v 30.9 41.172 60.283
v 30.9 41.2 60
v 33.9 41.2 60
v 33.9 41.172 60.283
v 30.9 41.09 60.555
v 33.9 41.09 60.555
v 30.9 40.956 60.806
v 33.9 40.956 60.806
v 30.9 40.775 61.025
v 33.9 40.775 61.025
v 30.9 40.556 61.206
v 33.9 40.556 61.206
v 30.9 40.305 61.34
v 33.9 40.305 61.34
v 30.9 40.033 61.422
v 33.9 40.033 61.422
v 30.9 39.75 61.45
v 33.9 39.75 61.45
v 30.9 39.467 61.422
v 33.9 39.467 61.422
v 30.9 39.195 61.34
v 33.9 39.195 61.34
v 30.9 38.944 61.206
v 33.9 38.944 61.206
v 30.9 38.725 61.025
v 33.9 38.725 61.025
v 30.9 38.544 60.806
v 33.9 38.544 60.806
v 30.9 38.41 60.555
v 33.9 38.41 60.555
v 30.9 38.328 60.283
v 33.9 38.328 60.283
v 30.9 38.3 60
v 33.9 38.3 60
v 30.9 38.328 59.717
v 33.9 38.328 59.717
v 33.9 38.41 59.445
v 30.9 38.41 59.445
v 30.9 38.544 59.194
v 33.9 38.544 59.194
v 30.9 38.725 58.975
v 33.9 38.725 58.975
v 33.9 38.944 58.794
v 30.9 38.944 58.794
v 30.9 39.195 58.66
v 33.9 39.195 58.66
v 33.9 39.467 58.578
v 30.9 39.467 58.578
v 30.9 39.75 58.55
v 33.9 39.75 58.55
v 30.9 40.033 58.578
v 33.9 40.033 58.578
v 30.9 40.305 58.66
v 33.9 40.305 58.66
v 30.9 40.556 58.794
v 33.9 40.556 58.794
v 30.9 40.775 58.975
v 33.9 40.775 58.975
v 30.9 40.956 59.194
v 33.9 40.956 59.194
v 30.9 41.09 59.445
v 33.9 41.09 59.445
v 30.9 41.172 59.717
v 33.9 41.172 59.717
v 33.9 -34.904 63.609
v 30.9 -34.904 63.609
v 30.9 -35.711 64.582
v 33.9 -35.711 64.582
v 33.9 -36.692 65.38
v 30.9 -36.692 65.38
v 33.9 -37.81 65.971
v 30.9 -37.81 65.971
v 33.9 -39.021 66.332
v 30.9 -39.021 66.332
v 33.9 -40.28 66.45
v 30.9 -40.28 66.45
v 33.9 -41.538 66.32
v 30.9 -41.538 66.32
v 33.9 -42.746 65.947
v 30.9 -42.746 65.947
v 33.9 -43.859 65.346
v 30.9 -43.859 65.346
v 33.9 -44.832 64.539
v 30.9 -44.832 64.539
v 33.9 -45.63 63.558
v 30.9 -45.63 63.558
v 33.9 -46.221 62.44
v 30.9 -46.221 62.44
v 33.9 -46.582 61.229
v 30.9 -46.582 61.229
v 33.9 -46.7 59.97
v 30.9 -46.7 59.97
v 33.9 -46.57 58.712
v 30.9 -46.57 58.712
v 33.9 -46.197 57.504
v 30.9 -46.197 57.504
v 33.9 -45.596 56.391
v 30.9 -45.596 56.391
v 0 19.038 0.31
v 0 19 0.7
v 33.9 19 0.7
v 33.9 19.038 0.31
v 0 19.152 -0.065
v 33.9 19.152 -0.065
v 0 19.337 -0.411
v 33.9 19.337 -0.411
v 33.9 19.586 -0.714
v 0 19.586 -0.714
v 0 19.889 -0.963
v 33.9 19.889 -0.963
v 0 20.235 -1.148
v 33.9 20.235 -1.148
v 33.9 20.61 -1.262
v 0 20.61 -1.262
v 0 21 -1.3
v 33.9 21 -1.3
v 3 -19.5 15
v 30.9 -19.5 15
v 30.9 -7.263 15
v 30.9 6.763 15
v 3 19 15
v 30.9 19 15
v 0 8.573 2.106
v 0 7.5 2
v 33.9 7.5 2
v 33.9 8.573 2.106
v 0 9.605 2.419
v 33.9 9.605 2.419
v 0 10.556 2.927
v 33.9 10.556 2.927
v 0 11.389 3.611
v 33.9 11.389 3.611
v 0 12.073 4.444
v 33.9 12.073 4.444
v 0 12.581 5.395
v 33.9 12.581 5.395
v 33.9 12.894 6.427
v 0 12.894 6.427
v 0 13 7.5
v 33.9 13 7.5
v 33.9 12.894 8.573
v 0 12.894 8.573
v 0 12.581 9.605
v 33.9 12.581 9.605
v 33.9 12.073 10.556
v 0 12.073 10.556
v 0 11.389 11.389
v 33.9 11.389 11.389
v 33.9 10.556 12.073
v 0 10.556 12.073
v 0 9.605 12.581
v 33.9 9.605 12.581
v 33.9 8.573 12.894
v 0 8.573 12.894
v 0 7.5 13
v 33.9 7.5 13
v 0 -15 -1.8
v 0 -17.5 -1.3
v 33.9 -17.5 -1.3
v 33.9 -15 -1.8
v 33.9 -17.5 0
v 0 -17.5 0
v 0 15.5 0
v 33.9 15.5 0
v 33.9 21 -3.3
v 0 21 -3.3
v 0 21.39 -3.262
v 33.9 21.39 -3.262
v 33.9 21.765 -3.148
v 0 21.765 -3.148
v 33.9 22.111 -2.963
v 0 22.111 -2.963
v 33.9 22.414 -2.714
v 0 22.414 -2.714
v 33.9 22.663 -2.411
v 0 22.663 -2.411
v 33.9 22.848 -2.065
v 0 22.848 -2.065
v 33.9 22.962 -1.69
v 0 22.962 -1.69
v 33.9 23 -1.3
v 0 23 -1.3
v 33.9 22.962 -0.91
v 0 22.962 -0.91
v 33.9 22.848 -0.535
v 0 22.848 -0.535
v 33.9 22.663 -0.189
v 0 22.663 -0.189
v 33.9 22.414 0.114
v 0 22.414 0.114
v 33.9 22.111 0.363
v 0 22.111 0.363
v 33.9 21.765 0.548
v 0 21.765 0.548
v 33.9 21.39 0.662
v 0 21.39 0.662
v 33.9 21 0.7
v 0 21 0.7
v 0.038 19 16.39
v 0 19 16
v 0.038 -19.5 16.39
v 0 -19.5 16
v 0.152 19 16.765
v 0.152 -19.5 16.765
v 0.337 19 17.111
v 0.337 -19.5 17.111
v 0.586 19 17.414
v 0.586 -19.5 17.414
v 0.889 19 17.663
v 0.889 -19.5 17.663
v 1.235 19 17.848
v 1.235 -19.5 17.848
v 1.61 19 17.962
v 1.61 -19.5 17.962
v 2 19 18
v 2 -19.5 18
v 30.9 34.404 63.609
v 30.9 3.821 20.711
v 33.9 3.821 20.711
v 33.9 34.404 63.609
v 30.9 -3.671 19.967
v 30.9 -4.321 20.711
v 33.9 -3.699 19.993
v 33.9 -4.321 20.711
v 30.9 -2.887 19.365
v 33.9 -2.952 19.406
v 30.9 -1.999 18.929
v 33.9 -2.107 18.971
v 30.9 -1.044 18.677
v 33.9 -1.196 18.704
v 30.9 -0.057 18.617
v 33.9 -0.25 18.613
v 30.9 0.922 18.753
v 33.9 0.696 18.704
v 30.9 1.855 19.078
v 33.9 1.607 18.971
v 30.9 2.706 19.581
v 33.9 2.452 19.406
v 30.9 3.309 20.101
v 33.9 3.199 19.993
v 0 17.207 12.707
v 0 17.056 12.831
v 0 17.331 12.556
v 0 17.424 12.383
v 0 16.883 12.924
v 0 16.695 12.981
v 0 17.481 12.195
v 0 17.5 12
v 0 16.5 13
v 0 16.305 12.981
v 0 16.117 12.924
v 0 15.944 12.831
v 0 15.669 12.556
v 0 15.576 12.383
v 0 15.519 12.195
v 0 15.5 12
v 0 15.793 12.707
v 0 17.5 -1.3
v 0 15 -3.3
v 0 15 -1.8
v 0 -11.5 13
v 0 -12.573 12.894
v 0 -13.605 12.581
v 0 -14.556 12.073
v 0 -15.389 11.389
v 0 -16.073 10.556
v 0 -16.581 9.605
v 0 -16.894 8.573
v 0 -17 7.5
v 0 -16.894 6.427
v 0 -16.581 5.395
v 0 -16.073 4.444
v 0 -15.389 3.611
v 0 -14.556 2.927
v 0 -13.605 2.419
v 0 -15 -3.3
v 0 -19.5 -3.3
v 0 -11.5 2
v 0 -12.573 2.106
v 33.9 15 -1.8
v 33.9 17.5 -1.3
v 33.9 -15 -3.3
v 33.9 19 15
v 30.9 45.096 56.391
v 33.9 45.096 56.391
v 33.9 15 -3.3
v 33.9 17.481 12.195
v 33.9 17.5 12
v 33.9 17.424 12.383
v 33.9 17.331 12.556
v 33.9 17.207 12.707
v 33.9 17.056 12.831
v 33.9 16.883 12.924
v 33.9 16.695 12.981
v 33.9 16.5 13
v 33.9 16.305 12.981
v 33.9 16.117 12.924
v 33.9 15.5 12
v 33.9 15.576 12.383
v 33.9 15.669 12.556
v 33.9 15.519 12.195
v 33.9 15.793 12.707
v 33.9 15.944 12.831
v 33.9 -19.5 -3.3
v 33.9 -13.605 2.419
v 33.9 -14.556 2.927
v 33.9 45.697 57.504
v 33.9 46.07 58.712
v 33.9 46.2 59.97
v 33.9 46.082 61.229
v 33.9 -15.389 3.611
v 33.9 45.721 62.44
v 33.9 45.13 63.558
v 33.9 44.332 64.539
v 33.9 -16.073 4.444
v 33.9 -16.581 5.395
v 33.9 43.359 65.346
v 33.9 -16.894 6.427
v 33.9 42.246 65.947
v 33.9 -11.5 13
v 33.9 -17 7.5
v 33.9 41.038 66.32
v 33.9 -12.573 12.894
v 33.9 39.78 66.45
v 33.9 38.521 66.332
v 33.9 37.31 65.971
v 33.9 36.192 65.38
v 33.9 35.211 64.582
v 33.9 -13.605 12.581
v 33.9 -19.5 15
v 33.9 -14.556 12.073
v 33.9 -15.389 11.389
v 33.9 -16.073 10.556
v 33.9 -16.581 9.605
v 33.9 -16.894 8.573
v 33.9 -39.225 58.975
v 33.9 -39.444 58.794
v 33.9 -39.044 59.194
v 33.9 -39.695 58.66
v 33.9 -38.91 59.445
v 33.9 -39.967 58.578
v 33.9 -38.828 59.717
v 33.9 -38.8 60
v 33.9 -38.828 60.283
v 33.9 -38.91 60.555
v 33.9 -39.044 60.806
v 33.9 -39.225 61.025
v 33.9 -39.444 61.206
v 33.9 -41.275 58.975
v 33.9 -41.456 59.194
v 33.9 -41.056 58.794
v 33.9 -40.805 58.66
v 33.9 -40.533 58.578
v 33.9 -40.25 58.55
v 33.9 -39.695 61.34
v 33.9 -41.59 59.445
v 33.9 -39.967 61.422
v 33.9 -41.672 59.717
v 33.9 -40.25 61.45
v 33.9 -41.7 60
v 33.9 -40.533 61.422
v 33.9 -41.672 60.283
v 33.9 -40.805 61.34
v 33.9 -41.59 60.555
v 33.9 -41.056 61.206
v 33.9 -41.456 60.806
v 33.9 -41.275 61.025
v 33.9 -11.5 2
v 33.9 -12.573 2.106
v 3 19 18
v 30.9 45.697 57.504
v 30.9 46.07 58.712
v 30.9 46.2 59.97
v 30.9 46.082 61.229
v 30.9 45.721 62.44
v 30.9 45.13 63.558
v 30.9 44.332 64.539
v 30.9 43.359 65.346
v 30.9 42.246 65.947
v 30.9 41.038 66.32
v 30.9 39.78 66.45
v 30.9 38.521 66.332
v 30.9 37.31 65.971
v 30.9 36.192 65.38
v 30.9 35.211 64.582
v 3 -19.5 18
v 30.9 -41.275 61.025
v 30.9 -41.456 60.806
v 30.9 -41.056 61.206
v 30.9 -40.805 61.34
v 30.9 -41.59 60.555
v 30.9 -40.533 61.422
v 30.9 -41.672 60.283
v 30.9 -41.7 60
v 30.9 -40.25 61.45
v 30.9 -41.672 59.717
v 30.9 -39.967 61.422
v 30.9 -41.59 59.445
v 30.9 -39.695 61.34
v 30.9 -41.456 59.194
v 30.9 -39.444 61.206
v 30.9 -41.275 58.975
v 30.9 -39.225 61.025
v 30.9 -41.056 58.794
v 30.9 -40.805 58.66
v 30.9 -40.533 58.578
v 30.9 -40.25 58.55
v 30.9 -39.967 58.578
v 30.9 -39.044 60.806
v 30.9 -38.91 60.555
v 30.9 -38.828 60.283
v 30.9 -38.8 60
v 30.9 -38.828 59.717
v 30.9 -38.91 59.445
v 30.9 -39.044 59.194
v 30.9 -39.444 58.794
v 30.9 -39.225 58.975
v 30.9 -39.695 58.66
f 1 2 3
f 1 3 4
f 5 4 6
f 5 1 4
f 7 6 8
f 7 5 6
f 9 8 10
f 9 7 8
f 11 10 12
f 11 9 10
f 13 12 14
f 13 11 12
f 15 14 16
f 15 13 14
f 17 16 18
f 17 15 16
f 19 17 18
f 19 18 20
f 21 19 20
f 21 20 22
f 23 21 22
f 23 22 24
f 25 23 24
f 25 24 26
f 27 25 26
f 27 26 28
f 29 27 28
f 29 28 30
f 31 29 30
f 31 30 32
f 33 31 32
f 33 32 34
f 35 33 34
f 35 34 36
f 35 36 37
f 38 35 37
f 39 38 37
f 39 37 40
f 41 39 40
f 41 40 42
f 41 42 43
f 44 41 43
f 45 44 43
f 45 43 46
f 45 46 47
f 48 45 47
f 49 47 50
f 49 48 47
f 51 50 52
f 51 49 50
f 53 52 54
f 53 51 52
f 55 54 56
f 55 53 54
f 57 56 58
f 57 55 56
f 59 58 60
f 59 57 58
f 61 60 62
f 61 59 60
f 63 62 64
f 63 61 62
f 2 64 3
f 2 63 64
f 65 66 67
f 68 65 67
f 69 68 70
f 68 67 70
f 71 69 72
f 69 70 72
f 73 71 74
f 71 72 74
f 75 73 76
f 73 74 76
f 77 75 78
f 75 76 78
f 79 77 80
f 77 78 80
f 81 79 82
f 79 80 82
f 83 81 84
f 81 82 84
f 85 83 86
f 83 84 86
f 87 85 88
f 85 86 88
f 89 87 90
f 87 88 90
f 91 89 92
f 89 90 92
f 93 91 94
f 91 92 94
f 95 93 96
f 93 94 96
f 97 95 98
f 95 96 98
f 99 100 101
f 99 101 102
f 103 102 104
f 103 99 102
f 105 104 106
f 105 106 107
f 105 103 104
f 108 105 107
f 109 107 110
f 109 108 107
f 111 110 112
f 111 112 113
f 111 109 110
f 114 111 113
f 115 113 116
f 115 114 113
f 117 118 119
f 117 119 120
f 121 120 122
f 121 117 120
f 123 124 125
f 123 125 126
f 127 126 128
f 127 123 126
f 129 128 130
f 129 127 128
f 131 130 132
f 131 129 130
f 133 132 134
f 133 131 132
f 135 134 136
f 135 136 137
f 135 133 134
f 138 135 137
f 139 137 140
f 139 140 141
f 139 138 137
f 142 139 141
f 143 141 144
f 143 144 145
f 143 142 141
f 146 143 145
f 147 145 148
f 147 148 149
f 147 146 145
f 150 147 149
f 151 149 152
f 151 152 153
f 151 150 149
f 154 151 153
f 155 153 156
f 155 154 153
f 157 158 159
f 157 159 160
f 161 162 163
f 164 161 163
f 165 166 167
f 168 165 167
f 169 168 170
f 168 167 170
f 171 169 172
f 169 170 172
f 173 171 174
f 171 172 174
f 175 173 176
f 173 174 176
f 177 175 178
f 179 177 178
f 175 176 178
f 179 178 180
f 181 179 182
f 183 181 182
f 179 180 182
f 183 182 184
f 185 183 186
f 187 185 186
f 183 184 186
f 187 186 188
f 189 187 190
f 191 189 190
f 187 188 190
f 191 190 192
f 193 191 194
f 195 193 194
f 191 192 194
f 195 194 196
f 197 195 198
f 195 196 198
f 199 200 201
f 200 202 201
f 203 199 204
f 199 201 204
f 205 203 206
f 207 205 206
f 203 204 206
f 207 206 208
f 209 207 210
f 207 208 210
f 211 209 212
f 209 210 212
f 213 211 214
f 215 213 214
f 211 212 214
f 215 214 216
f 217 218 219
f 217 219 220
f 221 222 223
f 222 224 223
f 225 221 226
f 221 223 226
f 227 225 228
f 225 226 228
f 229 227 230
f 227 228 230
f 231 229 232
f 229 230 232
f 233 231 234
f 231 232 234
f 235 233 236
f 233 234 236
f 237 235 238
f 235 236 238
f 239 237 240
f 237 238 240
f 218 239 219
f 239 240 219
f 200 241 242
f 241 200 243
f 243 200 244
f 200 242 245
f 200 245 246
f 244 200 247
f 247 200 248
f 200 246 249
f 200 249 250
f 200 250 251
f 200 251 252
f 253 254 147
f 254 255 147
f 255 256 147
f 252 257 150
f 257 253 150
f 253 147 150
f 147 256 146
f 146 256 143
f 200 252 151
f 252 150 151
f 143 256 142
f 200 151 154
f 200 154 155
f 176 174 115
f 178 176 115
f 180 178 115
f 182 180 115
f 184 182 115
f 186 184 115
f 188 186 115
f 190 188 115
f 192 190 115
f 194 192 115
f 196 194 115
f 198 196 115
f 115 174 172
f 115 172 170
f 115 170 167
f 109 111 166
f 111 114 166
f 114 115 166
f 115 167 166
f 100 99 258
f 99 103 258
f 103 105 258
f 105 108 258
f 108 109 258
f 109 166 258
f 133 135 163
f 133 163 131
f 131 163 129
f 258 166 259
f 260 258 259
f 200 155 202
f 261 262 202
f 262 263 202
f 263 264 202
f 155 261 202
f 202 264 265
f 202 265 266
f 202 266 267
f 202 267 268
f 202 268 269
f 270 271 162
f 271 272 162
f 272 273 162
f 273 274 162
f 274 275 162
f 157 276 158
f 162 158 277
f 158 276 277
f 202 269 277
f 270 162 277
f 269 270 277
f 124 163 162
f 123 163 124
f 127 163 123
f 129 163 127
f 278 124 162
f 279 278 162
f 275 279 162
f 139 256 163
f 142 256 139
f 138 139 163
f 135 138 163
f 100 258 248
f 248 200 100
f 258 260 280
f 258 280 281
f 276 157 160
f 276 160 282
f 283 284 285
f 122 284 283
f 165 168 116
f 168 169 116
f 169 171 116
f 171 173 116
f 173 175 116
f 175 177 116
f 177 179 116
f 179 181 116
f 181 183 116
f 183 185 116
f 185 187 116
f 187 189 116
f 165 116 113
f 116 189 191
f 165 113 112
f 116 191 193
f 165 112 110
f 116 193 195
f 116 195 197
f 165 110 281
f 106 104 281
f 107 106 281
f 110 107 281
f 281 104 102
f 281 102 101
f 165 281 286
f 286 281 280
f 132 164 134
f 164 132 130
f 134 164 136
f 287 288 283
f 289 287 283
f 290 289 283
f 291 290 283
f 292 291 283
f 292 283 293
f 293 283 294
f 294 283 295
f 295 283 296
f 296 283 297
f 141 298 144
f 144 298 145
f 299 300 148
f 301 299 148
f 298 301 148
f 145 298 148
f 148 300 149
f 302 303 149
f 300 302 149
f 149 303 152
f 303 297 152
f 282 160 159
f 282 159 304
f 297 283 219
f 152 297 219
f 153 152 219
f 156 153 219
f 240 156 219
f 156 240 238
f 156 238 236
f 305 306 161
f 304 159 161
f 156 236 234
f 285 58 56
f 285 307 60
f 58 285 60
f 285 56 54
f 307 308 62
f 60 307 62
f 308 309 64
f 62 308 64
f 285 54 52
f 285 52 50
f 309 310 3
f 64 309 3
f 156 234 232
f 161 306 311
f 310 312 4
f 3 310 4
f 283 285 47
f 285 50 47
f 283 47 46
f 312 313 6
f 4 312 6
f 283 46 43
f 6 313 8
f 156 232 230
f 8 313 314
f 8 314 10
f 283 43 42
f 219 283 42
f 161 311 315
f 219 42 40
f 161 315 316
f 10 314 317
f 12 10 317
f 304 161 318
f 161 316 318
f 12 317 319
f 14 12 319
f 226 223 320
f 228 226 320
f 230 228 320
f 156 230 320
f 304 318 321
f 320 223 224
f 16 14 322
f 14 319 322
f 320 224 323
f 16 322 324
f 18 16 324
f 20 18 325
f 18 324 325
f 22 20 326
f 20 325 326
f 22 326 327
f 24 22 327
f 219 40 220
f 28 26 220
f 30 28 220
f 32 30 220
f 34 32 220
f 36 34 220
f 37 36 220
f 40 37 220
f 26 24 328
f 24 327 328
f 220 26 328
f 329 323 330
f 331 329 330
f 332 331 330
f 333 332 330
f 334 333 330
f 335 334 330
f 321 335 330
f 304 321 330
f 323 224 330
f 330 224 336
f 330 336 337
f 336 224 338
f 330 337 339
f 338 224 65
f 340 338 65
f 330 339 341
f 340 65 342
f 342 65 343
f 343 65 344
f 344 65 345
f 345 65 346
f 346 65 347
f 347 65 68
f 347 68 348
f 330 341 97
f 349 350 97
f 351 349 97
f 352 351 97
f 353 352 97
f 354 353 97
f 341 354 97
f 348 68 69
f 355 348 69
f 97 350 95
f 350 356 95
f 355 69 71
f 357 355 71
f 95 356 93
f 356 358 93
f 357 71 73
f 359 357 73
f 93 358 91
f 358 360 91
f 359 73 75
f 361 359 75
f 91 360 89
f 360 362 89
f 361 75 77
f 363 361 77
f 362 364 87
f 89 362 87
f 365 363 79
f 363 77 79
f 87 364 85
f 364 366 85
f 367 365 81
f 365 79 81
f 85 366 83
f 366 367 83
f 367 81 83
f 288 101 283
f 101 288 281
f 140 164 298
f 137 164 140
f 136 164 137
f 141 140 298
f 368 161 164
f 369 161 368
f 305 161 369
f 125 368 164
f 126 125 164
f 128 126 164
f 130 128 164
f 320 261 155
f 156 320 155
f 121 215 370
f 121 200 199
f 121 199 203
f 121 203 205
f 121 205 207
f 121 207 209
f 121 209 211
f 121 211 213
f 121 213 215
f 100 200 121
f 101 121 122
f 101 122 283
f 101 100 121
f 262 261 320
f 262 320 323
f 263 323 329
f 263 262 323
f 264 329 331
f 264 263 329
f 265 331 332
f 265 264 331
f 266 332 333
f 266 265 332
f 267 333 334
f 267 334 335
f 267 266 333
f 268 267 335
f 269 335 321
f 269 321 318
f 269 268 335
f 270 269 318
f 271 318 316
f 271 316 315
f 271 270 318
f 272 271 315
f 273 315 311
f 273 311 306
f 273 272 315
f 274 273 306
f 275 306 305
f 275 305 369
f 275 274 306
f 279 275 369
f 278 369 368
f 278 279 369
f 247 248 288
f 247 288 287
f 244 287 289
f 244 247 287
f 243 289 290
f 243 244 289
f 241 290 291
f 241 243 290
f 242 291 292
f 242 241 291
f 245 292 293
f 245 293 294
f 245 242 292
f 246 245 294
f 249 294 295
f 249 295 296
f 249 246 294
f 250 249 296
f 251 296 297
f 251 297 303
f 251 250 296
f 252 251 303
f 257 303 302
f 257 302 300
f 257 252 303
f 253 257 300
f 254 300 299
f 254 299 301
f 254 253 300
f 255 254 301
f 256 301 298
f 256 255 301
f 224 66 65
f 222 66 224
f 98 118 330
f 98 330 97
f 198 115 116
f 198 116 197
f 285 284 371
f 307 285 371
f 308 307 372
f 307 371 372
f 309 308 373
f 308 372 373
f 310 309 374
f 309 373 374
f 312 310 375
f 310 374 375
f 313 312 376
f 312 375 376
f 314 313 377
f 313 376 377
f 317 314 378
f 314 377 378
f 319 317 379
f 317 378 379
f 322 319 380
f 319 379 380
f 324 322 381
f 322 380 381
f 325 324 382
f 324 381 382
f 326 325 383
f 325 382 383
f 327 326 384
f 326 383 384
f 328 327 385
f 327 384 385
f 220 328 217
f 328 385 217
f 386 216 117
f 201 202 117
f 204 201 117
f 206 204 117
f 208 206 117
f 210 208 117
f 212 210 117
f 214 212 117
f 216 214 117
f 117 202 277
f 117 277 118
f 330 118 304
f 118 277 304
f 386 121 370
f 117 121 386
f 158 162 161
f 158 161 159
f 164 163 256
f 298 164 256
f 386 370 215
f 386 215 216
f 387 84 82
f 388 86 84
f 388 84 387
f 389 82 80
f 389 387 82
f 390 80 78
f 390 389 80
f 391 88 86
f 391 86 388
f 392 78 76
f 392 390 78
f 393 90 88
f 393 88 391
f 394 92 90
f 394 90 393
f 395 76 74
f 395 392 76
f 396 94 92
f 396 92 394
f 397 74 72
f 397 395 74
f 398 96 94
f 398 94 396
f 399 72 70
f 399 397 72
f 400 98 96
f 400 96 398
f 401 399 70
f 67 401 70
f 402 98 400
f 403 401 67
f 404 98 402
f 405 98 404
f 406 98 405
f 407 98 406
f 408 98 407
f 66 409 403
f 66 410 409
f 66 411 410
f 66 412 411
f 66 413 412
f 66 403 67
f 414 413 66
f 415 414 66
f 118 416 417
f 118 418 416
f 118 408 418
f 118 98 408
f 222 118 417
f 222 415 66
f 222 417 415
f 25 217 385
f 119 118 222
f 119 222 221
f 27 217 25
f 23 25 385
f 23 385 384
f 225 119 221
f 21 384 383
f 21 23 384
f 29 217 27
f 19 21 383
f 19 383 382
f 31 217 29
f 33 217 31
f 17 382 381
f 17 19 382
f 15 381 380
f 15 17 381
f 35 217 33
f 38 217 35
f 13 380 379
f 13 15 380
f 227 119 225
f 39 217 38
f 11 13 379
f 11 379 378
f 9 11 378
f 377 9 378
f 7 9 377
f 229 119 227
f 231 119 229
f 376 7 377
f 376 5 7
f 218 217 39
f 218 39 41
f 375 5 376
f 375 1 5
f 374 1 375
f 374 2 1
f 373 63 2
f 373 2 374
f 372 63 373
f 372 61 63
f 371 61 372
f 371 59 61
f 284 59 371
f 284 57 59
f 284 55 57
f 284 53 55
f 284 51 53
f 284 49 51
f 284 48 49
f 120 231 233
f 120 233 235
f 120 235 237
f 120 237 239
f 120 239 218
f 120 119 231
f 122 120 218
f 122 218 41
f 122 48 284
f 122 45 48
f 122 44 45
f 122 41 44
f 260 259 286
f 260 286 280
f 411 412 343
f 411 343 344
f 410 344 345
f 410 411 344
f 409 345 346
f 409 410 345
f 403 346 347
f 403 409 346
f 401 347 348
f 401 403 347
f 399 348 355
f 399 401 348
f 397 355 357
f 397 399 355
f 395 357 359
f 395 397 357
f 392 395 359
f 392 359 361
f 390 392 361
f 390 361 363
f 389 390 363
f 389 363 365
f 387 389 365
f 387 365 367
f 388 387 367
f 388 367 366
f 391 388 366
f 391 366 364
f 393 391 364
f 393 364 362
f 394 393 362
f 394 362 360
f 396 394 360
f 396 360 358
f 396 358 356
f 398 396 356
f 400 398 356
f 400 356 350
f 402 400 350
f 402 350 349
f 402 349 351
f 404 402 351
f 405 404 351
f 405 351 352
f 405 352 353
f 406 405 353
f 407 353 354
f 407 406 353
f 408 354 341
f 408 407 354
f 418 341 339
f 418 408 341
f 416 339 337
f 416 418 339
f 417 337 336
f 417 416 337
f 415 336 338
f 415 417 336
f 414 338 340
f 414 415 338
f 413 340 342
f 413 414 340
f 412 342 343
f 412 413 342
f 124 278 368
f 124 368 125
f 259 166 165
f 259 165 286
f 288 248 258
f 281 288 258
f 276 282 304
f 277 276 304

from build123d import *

# Parameters (mm, degrees)
SKETCH001_R  = 1.45
PAD_DEPTH    = 33.9
SKETCH002_W  = 200
SKETCH002_H  = 80
POCKET_DEPTH = 30.9
SKETCH003_W  = 38.5
SKETCH003_H  = 3
PAD001_DEPTH = 3
FILLET_R     = 2
FILLET001_R  = 5


with BuildPart() as part:
    # Sketch001 → Pad (new body)
    with BuildSketch(Plane.YZ):
        with BuildLine():
            Line((-15, -3.3), (-19.5, -3.3))
            Line((-19.5, -3.3), (-19.5, 15))
            Line((-19.5, 15), (-45.596074, 56.3914))
            ThreePointArc((-34.903926, 63.6086), (-43.8586, 65.346074), (-45.596074, 56.3914))
            Line((-34.903926, 63.6086), (-0.25, 15))
            Line((-0.25, 15), (34.403926, 63.6086))
            ThreePointArc((45.096074, 56.3914), (43.3586, 65.346074), (34.403926, 63.6086))
            Line((45.096074, 56.3914), (19, 15))
            Line((19, 15), (19, 0.7))
            ThreePointArc((19, 0.7), (19.585786, -0.714214), (21, -1.3))
            Line((21, -1.3), (21, 0.7))
            ThreePointArc((21, -3.3), (23, -1.3), (21, 0.7))
            Line((21, -3.3), (15, -3.3))
            Line((15, -3.3), (15, -1.8))
            Line((15, -1.8), (17.5, -1.3))
            Line((17.5, -1.3), (17.5, 0))
            Line((17.5, 12), (17.5, 0))
            ThreePointArc((17.5, 12), (16.5, 13), (15.5, 12))
            Line((15.5, 0), (15.5, 12))
            Line((-17.5, 0), (15.5, 0))
            Line((-17.5, 0), (-17.5, -1.3))
            Line((-17.5, -1.3), (-15, -1.8))
            Line((-15, -1.8), (-15, -3.3))
        make_face()
        with Locations((-40.25, 60)):
            Circle(SKETCH001_R, mode=Mode.SUBTRACT)
        with Locations((39.75, 60)):
            Circle(SKETCH001_R, mode=Mode.SUBTRACT)
        with BuildLine():
            ThreePointArc((-11.5, 13), (-17, 7.5), (-11.5, 2))
            Line((-11.5, 2), (7.5, 2))
            ThreePointArc((7.5, 2), (13, 7.5), (7.5, 13))
            Line((-11.5, 13), (7.5, 13))
        make_face(mode=Mode.SUBTRACT)
    extrude(amount=PAD_DEPTH)

    # Sketch002 (on Face30 of Pad) → Pocket (cut)
    with BuildSketch(Plane(origin=(0, 0, 0), x_dir=(0, 1, 0), z_dir=(-1, 0, 0))):
        with Locations((19, -55)):
            Rectangle(SKETCH002_W, SKETCH002_H)
    extrude(amount=-POCKET_DEPTH, mode=Mode.SUBTRACT)

    # Sketch003 (on Face18 of Pocket) → Pad001 (join)
    with BuildSketch(Plane(origin=(0, 0, 15), x_dir=(0, -1, 0), z_dir=(0, 0, 1))):
        with Locations((0.25, 1.5)):
            Rectangle(SKETCH003_W, SKETCH003_H)
    extrude(amount=PAD001_DEPTH)

    # Fillet
    fillet_edges = [part.edges().sort_by_distance(p)[0] for p in [
        (0, -0.25, 18),
    ]]
    fillet(fillet_edges, radius=FILLET_R)

    # Fillet001
    fillet001_edges = [part.edges().sort_by_distance(p)[0] for p in [
        (32.4, -0.25, 15),
    ]]
    fillet(fillet001_edges, radius=FILLET001_R)


solid = part.part
